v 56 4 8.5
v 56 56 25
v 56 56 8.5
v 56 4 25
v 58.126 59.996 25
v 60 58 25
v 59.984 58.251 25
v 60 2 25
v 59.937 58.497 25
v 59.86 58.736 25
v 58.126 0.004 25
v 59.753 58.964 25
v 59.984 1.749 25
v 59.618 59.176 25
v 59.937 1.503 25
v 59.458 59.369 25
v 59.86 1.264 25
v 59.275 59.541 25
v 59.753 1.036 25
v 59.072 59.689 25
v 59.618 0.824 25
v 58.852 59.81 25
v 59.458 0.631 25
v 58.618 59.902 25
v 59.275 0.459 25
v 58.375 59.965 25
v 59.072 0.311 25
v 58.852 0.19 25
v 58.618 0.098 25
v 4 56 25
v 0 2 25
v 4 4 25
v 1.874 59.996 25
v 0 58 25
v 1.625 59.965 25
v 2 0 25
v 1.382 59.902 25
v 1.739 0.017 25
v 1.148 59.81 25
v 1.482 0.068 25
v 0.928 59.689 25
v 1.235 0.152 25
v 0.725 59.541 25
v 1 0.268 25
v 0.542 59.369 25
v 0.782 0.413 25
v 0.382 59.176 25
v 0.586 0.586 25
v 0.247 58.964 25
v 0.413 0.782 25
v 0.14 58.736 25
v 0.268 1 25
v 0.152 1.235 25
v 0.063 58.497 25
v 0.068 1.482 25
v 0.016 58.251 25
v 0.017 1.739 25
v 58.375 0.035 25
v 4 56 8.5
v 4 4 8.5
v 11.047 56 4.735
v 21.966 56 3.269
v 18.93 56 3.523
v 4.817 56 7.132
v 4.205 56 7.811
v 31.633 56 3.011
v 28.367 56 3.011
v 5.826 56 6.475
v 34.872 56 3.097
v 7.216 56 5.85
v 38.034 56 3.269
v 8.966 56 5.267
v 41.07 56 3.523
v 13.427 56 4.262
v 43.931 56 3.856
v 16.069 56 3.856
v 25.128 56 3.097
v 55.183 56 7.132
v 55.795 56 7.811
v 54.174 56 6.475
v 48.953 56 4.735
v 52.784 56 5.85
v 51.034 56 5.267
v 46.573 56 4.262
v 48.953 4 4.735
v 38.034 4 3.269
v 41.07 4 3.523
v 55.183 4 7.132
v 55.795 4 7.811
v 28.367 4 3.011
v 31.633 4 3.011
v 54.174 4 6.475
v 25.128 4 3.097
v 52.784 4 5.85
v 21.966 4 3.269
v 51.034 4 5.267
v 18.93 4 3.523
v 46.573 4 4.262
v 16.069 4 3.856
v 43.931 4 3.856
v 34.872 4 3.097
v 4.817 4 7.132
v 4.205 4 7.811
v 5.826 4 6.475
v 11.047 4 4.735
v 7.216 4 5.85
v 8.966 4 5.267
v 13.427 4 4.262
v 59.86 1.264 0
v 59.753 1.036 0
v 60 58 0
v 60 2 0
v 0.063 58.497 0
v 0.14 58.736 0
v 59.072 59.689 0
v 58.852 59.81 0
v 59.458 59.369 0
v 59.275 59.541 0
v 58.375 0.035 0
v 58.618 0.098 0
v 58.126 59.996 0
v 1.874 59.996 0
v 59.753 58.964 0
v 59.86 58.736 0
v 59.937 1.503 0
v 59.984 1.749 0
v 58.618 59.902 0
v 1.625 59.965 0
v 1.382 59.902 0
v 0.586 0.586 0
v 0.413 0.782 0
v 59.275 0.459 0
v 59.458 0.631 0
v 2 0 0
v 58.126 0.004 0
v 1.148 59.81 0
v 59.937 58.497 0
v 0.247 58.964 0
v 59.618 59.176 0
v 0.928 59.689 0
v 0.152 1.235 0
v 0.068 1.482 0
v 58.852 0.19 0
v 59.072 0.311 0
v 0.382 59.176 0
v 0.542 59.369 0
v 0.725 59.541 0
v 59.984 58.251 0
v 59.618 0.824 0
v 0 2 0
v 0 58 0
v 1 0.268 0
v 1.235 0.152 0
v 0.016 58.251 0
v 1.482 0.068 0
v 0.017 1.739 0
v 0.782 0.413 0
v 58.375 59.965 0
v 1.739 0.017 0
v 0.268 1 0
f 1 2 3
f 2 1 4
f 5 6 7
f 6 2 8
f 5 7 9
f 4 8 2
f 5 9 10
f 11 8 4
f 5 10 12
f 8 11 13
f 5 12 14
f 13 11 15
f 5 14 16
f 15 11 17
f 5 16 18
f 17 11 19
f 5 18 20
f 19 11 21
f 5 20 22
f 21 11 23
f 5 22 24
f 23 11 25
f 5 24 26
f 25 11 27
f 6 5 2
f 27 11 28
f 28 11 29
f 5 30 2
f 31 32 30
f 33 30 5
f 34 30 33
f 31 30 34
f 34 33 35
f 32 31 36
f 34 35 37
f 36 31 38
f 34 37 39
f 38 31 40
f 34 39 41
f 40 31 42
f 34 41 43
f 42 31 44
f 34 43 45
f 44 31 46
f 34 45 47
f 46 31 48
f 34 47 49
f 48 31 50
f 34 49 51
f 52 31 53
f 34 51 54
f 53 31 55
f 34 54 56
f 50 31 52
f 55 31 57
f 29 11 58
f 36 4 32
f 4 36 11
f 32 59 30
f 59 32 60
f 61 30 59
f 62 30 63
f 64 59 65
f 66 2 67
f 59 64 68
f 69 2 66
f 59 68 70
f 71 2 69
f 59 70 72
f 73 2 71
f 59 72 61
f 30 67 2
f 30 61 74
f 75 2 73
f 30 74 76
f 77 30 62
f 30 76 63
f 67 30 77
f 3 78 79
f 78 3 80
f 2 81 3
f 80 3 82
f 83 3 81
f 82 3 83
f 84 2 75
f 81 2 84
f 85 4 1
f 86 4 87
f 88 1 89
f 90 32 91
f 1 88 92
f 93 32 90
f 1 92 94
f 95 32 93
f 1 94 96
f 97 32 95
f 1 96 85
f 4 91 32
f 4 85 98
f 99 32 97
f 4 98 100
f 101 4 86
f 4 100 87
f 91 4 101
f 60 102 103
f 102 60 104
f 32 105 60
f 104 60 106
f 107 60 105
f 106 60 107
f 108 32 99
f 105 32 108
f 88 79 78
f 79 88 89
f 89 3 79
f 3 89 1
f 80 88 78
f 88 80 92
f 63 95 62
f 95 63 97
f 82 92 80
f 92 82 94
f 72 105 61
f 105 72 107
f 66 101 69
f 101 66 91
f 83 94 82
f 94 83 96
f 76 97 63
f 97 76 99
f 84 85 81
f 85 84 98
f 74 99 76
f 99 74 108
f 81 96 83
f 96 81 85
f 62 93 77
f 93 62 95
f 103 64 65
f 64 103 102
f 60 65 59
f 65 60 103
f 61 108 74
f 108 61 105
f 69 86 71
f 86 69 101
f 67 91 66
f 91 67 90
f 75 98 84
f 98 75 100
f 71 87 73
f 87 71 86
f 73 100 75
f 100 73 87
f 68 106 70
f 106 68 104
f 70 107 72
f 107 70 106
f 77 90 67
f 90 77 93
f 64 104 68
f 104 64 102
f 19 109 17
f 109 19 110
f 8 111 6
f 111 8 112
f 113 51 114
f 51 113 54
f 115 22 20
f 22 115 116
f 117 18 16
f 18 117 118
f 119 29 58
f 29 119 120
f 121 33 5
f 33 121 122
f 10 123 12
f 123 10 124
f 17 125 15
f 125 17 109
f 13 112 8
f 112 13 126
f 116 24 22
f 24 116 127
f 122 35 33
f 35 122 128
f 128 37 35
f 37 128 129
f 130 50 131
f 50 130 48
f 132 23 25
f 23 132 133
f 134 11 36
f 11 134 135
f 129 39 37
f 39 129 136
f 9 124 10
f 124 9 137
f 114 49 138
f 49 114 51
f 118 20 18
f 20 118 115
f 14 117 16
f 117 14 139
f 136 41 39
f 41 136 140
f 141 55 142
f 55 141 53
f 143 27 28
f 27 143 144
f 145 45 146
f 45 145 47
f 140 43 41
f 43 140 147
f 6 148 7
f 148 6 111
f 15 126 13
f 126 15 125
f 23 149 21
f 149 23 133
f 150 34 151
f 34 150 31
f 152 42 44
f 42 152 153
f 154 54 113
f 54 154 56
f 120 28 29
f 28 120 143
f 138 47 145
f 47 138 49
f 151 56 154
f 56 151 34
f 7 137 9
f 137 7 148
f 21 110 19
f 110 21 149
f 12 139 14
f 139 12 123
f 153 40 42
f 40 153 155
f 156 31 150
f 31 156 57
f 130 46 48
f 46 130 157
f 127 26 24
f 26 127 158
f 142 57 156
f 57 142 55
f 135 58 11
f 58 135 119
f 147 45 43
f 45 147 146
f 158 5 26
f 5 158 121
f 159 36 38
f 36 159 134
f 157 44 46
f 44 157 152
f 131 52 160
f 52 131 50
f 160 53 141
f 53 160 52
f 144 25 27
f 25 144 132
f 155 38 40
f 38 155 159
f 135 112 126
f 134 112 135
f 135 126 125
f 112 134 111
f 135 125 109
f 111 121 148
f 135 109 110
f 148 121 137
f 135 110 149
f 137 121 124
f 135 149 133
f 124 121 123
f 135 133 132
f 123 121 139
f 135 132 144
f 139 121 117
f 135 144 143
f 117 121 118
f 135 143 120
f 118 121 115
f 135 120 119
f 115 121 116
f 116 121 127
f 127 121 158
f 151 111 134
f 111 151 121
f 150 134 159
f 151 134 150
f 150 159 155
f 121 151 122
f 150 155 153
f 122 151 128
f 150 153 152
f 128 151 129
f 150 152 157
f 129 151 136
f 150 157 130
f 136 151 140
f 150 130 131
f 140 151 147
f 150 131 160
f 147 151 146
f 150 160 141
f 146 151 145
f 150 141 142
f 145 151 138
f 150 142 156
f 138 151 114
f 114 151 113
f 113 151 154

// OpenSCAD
$fn=48;
translate([0,0,0])
{
difference()
{
    translate(v = [2.00, 2.00, 0.00])
    {
        hull()
        {
            cylinder(center = false, r1 = 2, r2 = 2, h = 25);
            translate(v = [56.00, 0.00, 0.00])
            {
                cylinder(center = false, r1 = 2, r2 = 2, h = 25, $fn = 50);
            }
            translate(v = [0.00, 56.00, 0.00])
            {
                cylinder(center = false, r1 = 2, r2 = 2, h = 25, $fn = 50);
            }
            translate(v = [56.00, 56.00, 0.00])
            {
                cylinder(center = false, r1 = 2, r2 = 2, h = 25, $fn = 50);
            }
        }
    }
    translate(v = [4.00, 4.00, 3.00])
    {
        union()
        {
            translate(v = [0.00, 0.00, 5.50])
            {
                cube(size = [52.00, 52.00, 16.50], center = false); 
            }
            translate(v = [26.00, 0.00, 5.50])
            {
                scale(v = [26.00, 52.00, 5.50])
                {
                    rotate([-90.00, 0.00, 0.00])
                    {
                        cylinder(center = false, r1 = 1, r2 = 1, h = 1, $fn = 50);
                    }
                }
            }
        }
    }
}

}
